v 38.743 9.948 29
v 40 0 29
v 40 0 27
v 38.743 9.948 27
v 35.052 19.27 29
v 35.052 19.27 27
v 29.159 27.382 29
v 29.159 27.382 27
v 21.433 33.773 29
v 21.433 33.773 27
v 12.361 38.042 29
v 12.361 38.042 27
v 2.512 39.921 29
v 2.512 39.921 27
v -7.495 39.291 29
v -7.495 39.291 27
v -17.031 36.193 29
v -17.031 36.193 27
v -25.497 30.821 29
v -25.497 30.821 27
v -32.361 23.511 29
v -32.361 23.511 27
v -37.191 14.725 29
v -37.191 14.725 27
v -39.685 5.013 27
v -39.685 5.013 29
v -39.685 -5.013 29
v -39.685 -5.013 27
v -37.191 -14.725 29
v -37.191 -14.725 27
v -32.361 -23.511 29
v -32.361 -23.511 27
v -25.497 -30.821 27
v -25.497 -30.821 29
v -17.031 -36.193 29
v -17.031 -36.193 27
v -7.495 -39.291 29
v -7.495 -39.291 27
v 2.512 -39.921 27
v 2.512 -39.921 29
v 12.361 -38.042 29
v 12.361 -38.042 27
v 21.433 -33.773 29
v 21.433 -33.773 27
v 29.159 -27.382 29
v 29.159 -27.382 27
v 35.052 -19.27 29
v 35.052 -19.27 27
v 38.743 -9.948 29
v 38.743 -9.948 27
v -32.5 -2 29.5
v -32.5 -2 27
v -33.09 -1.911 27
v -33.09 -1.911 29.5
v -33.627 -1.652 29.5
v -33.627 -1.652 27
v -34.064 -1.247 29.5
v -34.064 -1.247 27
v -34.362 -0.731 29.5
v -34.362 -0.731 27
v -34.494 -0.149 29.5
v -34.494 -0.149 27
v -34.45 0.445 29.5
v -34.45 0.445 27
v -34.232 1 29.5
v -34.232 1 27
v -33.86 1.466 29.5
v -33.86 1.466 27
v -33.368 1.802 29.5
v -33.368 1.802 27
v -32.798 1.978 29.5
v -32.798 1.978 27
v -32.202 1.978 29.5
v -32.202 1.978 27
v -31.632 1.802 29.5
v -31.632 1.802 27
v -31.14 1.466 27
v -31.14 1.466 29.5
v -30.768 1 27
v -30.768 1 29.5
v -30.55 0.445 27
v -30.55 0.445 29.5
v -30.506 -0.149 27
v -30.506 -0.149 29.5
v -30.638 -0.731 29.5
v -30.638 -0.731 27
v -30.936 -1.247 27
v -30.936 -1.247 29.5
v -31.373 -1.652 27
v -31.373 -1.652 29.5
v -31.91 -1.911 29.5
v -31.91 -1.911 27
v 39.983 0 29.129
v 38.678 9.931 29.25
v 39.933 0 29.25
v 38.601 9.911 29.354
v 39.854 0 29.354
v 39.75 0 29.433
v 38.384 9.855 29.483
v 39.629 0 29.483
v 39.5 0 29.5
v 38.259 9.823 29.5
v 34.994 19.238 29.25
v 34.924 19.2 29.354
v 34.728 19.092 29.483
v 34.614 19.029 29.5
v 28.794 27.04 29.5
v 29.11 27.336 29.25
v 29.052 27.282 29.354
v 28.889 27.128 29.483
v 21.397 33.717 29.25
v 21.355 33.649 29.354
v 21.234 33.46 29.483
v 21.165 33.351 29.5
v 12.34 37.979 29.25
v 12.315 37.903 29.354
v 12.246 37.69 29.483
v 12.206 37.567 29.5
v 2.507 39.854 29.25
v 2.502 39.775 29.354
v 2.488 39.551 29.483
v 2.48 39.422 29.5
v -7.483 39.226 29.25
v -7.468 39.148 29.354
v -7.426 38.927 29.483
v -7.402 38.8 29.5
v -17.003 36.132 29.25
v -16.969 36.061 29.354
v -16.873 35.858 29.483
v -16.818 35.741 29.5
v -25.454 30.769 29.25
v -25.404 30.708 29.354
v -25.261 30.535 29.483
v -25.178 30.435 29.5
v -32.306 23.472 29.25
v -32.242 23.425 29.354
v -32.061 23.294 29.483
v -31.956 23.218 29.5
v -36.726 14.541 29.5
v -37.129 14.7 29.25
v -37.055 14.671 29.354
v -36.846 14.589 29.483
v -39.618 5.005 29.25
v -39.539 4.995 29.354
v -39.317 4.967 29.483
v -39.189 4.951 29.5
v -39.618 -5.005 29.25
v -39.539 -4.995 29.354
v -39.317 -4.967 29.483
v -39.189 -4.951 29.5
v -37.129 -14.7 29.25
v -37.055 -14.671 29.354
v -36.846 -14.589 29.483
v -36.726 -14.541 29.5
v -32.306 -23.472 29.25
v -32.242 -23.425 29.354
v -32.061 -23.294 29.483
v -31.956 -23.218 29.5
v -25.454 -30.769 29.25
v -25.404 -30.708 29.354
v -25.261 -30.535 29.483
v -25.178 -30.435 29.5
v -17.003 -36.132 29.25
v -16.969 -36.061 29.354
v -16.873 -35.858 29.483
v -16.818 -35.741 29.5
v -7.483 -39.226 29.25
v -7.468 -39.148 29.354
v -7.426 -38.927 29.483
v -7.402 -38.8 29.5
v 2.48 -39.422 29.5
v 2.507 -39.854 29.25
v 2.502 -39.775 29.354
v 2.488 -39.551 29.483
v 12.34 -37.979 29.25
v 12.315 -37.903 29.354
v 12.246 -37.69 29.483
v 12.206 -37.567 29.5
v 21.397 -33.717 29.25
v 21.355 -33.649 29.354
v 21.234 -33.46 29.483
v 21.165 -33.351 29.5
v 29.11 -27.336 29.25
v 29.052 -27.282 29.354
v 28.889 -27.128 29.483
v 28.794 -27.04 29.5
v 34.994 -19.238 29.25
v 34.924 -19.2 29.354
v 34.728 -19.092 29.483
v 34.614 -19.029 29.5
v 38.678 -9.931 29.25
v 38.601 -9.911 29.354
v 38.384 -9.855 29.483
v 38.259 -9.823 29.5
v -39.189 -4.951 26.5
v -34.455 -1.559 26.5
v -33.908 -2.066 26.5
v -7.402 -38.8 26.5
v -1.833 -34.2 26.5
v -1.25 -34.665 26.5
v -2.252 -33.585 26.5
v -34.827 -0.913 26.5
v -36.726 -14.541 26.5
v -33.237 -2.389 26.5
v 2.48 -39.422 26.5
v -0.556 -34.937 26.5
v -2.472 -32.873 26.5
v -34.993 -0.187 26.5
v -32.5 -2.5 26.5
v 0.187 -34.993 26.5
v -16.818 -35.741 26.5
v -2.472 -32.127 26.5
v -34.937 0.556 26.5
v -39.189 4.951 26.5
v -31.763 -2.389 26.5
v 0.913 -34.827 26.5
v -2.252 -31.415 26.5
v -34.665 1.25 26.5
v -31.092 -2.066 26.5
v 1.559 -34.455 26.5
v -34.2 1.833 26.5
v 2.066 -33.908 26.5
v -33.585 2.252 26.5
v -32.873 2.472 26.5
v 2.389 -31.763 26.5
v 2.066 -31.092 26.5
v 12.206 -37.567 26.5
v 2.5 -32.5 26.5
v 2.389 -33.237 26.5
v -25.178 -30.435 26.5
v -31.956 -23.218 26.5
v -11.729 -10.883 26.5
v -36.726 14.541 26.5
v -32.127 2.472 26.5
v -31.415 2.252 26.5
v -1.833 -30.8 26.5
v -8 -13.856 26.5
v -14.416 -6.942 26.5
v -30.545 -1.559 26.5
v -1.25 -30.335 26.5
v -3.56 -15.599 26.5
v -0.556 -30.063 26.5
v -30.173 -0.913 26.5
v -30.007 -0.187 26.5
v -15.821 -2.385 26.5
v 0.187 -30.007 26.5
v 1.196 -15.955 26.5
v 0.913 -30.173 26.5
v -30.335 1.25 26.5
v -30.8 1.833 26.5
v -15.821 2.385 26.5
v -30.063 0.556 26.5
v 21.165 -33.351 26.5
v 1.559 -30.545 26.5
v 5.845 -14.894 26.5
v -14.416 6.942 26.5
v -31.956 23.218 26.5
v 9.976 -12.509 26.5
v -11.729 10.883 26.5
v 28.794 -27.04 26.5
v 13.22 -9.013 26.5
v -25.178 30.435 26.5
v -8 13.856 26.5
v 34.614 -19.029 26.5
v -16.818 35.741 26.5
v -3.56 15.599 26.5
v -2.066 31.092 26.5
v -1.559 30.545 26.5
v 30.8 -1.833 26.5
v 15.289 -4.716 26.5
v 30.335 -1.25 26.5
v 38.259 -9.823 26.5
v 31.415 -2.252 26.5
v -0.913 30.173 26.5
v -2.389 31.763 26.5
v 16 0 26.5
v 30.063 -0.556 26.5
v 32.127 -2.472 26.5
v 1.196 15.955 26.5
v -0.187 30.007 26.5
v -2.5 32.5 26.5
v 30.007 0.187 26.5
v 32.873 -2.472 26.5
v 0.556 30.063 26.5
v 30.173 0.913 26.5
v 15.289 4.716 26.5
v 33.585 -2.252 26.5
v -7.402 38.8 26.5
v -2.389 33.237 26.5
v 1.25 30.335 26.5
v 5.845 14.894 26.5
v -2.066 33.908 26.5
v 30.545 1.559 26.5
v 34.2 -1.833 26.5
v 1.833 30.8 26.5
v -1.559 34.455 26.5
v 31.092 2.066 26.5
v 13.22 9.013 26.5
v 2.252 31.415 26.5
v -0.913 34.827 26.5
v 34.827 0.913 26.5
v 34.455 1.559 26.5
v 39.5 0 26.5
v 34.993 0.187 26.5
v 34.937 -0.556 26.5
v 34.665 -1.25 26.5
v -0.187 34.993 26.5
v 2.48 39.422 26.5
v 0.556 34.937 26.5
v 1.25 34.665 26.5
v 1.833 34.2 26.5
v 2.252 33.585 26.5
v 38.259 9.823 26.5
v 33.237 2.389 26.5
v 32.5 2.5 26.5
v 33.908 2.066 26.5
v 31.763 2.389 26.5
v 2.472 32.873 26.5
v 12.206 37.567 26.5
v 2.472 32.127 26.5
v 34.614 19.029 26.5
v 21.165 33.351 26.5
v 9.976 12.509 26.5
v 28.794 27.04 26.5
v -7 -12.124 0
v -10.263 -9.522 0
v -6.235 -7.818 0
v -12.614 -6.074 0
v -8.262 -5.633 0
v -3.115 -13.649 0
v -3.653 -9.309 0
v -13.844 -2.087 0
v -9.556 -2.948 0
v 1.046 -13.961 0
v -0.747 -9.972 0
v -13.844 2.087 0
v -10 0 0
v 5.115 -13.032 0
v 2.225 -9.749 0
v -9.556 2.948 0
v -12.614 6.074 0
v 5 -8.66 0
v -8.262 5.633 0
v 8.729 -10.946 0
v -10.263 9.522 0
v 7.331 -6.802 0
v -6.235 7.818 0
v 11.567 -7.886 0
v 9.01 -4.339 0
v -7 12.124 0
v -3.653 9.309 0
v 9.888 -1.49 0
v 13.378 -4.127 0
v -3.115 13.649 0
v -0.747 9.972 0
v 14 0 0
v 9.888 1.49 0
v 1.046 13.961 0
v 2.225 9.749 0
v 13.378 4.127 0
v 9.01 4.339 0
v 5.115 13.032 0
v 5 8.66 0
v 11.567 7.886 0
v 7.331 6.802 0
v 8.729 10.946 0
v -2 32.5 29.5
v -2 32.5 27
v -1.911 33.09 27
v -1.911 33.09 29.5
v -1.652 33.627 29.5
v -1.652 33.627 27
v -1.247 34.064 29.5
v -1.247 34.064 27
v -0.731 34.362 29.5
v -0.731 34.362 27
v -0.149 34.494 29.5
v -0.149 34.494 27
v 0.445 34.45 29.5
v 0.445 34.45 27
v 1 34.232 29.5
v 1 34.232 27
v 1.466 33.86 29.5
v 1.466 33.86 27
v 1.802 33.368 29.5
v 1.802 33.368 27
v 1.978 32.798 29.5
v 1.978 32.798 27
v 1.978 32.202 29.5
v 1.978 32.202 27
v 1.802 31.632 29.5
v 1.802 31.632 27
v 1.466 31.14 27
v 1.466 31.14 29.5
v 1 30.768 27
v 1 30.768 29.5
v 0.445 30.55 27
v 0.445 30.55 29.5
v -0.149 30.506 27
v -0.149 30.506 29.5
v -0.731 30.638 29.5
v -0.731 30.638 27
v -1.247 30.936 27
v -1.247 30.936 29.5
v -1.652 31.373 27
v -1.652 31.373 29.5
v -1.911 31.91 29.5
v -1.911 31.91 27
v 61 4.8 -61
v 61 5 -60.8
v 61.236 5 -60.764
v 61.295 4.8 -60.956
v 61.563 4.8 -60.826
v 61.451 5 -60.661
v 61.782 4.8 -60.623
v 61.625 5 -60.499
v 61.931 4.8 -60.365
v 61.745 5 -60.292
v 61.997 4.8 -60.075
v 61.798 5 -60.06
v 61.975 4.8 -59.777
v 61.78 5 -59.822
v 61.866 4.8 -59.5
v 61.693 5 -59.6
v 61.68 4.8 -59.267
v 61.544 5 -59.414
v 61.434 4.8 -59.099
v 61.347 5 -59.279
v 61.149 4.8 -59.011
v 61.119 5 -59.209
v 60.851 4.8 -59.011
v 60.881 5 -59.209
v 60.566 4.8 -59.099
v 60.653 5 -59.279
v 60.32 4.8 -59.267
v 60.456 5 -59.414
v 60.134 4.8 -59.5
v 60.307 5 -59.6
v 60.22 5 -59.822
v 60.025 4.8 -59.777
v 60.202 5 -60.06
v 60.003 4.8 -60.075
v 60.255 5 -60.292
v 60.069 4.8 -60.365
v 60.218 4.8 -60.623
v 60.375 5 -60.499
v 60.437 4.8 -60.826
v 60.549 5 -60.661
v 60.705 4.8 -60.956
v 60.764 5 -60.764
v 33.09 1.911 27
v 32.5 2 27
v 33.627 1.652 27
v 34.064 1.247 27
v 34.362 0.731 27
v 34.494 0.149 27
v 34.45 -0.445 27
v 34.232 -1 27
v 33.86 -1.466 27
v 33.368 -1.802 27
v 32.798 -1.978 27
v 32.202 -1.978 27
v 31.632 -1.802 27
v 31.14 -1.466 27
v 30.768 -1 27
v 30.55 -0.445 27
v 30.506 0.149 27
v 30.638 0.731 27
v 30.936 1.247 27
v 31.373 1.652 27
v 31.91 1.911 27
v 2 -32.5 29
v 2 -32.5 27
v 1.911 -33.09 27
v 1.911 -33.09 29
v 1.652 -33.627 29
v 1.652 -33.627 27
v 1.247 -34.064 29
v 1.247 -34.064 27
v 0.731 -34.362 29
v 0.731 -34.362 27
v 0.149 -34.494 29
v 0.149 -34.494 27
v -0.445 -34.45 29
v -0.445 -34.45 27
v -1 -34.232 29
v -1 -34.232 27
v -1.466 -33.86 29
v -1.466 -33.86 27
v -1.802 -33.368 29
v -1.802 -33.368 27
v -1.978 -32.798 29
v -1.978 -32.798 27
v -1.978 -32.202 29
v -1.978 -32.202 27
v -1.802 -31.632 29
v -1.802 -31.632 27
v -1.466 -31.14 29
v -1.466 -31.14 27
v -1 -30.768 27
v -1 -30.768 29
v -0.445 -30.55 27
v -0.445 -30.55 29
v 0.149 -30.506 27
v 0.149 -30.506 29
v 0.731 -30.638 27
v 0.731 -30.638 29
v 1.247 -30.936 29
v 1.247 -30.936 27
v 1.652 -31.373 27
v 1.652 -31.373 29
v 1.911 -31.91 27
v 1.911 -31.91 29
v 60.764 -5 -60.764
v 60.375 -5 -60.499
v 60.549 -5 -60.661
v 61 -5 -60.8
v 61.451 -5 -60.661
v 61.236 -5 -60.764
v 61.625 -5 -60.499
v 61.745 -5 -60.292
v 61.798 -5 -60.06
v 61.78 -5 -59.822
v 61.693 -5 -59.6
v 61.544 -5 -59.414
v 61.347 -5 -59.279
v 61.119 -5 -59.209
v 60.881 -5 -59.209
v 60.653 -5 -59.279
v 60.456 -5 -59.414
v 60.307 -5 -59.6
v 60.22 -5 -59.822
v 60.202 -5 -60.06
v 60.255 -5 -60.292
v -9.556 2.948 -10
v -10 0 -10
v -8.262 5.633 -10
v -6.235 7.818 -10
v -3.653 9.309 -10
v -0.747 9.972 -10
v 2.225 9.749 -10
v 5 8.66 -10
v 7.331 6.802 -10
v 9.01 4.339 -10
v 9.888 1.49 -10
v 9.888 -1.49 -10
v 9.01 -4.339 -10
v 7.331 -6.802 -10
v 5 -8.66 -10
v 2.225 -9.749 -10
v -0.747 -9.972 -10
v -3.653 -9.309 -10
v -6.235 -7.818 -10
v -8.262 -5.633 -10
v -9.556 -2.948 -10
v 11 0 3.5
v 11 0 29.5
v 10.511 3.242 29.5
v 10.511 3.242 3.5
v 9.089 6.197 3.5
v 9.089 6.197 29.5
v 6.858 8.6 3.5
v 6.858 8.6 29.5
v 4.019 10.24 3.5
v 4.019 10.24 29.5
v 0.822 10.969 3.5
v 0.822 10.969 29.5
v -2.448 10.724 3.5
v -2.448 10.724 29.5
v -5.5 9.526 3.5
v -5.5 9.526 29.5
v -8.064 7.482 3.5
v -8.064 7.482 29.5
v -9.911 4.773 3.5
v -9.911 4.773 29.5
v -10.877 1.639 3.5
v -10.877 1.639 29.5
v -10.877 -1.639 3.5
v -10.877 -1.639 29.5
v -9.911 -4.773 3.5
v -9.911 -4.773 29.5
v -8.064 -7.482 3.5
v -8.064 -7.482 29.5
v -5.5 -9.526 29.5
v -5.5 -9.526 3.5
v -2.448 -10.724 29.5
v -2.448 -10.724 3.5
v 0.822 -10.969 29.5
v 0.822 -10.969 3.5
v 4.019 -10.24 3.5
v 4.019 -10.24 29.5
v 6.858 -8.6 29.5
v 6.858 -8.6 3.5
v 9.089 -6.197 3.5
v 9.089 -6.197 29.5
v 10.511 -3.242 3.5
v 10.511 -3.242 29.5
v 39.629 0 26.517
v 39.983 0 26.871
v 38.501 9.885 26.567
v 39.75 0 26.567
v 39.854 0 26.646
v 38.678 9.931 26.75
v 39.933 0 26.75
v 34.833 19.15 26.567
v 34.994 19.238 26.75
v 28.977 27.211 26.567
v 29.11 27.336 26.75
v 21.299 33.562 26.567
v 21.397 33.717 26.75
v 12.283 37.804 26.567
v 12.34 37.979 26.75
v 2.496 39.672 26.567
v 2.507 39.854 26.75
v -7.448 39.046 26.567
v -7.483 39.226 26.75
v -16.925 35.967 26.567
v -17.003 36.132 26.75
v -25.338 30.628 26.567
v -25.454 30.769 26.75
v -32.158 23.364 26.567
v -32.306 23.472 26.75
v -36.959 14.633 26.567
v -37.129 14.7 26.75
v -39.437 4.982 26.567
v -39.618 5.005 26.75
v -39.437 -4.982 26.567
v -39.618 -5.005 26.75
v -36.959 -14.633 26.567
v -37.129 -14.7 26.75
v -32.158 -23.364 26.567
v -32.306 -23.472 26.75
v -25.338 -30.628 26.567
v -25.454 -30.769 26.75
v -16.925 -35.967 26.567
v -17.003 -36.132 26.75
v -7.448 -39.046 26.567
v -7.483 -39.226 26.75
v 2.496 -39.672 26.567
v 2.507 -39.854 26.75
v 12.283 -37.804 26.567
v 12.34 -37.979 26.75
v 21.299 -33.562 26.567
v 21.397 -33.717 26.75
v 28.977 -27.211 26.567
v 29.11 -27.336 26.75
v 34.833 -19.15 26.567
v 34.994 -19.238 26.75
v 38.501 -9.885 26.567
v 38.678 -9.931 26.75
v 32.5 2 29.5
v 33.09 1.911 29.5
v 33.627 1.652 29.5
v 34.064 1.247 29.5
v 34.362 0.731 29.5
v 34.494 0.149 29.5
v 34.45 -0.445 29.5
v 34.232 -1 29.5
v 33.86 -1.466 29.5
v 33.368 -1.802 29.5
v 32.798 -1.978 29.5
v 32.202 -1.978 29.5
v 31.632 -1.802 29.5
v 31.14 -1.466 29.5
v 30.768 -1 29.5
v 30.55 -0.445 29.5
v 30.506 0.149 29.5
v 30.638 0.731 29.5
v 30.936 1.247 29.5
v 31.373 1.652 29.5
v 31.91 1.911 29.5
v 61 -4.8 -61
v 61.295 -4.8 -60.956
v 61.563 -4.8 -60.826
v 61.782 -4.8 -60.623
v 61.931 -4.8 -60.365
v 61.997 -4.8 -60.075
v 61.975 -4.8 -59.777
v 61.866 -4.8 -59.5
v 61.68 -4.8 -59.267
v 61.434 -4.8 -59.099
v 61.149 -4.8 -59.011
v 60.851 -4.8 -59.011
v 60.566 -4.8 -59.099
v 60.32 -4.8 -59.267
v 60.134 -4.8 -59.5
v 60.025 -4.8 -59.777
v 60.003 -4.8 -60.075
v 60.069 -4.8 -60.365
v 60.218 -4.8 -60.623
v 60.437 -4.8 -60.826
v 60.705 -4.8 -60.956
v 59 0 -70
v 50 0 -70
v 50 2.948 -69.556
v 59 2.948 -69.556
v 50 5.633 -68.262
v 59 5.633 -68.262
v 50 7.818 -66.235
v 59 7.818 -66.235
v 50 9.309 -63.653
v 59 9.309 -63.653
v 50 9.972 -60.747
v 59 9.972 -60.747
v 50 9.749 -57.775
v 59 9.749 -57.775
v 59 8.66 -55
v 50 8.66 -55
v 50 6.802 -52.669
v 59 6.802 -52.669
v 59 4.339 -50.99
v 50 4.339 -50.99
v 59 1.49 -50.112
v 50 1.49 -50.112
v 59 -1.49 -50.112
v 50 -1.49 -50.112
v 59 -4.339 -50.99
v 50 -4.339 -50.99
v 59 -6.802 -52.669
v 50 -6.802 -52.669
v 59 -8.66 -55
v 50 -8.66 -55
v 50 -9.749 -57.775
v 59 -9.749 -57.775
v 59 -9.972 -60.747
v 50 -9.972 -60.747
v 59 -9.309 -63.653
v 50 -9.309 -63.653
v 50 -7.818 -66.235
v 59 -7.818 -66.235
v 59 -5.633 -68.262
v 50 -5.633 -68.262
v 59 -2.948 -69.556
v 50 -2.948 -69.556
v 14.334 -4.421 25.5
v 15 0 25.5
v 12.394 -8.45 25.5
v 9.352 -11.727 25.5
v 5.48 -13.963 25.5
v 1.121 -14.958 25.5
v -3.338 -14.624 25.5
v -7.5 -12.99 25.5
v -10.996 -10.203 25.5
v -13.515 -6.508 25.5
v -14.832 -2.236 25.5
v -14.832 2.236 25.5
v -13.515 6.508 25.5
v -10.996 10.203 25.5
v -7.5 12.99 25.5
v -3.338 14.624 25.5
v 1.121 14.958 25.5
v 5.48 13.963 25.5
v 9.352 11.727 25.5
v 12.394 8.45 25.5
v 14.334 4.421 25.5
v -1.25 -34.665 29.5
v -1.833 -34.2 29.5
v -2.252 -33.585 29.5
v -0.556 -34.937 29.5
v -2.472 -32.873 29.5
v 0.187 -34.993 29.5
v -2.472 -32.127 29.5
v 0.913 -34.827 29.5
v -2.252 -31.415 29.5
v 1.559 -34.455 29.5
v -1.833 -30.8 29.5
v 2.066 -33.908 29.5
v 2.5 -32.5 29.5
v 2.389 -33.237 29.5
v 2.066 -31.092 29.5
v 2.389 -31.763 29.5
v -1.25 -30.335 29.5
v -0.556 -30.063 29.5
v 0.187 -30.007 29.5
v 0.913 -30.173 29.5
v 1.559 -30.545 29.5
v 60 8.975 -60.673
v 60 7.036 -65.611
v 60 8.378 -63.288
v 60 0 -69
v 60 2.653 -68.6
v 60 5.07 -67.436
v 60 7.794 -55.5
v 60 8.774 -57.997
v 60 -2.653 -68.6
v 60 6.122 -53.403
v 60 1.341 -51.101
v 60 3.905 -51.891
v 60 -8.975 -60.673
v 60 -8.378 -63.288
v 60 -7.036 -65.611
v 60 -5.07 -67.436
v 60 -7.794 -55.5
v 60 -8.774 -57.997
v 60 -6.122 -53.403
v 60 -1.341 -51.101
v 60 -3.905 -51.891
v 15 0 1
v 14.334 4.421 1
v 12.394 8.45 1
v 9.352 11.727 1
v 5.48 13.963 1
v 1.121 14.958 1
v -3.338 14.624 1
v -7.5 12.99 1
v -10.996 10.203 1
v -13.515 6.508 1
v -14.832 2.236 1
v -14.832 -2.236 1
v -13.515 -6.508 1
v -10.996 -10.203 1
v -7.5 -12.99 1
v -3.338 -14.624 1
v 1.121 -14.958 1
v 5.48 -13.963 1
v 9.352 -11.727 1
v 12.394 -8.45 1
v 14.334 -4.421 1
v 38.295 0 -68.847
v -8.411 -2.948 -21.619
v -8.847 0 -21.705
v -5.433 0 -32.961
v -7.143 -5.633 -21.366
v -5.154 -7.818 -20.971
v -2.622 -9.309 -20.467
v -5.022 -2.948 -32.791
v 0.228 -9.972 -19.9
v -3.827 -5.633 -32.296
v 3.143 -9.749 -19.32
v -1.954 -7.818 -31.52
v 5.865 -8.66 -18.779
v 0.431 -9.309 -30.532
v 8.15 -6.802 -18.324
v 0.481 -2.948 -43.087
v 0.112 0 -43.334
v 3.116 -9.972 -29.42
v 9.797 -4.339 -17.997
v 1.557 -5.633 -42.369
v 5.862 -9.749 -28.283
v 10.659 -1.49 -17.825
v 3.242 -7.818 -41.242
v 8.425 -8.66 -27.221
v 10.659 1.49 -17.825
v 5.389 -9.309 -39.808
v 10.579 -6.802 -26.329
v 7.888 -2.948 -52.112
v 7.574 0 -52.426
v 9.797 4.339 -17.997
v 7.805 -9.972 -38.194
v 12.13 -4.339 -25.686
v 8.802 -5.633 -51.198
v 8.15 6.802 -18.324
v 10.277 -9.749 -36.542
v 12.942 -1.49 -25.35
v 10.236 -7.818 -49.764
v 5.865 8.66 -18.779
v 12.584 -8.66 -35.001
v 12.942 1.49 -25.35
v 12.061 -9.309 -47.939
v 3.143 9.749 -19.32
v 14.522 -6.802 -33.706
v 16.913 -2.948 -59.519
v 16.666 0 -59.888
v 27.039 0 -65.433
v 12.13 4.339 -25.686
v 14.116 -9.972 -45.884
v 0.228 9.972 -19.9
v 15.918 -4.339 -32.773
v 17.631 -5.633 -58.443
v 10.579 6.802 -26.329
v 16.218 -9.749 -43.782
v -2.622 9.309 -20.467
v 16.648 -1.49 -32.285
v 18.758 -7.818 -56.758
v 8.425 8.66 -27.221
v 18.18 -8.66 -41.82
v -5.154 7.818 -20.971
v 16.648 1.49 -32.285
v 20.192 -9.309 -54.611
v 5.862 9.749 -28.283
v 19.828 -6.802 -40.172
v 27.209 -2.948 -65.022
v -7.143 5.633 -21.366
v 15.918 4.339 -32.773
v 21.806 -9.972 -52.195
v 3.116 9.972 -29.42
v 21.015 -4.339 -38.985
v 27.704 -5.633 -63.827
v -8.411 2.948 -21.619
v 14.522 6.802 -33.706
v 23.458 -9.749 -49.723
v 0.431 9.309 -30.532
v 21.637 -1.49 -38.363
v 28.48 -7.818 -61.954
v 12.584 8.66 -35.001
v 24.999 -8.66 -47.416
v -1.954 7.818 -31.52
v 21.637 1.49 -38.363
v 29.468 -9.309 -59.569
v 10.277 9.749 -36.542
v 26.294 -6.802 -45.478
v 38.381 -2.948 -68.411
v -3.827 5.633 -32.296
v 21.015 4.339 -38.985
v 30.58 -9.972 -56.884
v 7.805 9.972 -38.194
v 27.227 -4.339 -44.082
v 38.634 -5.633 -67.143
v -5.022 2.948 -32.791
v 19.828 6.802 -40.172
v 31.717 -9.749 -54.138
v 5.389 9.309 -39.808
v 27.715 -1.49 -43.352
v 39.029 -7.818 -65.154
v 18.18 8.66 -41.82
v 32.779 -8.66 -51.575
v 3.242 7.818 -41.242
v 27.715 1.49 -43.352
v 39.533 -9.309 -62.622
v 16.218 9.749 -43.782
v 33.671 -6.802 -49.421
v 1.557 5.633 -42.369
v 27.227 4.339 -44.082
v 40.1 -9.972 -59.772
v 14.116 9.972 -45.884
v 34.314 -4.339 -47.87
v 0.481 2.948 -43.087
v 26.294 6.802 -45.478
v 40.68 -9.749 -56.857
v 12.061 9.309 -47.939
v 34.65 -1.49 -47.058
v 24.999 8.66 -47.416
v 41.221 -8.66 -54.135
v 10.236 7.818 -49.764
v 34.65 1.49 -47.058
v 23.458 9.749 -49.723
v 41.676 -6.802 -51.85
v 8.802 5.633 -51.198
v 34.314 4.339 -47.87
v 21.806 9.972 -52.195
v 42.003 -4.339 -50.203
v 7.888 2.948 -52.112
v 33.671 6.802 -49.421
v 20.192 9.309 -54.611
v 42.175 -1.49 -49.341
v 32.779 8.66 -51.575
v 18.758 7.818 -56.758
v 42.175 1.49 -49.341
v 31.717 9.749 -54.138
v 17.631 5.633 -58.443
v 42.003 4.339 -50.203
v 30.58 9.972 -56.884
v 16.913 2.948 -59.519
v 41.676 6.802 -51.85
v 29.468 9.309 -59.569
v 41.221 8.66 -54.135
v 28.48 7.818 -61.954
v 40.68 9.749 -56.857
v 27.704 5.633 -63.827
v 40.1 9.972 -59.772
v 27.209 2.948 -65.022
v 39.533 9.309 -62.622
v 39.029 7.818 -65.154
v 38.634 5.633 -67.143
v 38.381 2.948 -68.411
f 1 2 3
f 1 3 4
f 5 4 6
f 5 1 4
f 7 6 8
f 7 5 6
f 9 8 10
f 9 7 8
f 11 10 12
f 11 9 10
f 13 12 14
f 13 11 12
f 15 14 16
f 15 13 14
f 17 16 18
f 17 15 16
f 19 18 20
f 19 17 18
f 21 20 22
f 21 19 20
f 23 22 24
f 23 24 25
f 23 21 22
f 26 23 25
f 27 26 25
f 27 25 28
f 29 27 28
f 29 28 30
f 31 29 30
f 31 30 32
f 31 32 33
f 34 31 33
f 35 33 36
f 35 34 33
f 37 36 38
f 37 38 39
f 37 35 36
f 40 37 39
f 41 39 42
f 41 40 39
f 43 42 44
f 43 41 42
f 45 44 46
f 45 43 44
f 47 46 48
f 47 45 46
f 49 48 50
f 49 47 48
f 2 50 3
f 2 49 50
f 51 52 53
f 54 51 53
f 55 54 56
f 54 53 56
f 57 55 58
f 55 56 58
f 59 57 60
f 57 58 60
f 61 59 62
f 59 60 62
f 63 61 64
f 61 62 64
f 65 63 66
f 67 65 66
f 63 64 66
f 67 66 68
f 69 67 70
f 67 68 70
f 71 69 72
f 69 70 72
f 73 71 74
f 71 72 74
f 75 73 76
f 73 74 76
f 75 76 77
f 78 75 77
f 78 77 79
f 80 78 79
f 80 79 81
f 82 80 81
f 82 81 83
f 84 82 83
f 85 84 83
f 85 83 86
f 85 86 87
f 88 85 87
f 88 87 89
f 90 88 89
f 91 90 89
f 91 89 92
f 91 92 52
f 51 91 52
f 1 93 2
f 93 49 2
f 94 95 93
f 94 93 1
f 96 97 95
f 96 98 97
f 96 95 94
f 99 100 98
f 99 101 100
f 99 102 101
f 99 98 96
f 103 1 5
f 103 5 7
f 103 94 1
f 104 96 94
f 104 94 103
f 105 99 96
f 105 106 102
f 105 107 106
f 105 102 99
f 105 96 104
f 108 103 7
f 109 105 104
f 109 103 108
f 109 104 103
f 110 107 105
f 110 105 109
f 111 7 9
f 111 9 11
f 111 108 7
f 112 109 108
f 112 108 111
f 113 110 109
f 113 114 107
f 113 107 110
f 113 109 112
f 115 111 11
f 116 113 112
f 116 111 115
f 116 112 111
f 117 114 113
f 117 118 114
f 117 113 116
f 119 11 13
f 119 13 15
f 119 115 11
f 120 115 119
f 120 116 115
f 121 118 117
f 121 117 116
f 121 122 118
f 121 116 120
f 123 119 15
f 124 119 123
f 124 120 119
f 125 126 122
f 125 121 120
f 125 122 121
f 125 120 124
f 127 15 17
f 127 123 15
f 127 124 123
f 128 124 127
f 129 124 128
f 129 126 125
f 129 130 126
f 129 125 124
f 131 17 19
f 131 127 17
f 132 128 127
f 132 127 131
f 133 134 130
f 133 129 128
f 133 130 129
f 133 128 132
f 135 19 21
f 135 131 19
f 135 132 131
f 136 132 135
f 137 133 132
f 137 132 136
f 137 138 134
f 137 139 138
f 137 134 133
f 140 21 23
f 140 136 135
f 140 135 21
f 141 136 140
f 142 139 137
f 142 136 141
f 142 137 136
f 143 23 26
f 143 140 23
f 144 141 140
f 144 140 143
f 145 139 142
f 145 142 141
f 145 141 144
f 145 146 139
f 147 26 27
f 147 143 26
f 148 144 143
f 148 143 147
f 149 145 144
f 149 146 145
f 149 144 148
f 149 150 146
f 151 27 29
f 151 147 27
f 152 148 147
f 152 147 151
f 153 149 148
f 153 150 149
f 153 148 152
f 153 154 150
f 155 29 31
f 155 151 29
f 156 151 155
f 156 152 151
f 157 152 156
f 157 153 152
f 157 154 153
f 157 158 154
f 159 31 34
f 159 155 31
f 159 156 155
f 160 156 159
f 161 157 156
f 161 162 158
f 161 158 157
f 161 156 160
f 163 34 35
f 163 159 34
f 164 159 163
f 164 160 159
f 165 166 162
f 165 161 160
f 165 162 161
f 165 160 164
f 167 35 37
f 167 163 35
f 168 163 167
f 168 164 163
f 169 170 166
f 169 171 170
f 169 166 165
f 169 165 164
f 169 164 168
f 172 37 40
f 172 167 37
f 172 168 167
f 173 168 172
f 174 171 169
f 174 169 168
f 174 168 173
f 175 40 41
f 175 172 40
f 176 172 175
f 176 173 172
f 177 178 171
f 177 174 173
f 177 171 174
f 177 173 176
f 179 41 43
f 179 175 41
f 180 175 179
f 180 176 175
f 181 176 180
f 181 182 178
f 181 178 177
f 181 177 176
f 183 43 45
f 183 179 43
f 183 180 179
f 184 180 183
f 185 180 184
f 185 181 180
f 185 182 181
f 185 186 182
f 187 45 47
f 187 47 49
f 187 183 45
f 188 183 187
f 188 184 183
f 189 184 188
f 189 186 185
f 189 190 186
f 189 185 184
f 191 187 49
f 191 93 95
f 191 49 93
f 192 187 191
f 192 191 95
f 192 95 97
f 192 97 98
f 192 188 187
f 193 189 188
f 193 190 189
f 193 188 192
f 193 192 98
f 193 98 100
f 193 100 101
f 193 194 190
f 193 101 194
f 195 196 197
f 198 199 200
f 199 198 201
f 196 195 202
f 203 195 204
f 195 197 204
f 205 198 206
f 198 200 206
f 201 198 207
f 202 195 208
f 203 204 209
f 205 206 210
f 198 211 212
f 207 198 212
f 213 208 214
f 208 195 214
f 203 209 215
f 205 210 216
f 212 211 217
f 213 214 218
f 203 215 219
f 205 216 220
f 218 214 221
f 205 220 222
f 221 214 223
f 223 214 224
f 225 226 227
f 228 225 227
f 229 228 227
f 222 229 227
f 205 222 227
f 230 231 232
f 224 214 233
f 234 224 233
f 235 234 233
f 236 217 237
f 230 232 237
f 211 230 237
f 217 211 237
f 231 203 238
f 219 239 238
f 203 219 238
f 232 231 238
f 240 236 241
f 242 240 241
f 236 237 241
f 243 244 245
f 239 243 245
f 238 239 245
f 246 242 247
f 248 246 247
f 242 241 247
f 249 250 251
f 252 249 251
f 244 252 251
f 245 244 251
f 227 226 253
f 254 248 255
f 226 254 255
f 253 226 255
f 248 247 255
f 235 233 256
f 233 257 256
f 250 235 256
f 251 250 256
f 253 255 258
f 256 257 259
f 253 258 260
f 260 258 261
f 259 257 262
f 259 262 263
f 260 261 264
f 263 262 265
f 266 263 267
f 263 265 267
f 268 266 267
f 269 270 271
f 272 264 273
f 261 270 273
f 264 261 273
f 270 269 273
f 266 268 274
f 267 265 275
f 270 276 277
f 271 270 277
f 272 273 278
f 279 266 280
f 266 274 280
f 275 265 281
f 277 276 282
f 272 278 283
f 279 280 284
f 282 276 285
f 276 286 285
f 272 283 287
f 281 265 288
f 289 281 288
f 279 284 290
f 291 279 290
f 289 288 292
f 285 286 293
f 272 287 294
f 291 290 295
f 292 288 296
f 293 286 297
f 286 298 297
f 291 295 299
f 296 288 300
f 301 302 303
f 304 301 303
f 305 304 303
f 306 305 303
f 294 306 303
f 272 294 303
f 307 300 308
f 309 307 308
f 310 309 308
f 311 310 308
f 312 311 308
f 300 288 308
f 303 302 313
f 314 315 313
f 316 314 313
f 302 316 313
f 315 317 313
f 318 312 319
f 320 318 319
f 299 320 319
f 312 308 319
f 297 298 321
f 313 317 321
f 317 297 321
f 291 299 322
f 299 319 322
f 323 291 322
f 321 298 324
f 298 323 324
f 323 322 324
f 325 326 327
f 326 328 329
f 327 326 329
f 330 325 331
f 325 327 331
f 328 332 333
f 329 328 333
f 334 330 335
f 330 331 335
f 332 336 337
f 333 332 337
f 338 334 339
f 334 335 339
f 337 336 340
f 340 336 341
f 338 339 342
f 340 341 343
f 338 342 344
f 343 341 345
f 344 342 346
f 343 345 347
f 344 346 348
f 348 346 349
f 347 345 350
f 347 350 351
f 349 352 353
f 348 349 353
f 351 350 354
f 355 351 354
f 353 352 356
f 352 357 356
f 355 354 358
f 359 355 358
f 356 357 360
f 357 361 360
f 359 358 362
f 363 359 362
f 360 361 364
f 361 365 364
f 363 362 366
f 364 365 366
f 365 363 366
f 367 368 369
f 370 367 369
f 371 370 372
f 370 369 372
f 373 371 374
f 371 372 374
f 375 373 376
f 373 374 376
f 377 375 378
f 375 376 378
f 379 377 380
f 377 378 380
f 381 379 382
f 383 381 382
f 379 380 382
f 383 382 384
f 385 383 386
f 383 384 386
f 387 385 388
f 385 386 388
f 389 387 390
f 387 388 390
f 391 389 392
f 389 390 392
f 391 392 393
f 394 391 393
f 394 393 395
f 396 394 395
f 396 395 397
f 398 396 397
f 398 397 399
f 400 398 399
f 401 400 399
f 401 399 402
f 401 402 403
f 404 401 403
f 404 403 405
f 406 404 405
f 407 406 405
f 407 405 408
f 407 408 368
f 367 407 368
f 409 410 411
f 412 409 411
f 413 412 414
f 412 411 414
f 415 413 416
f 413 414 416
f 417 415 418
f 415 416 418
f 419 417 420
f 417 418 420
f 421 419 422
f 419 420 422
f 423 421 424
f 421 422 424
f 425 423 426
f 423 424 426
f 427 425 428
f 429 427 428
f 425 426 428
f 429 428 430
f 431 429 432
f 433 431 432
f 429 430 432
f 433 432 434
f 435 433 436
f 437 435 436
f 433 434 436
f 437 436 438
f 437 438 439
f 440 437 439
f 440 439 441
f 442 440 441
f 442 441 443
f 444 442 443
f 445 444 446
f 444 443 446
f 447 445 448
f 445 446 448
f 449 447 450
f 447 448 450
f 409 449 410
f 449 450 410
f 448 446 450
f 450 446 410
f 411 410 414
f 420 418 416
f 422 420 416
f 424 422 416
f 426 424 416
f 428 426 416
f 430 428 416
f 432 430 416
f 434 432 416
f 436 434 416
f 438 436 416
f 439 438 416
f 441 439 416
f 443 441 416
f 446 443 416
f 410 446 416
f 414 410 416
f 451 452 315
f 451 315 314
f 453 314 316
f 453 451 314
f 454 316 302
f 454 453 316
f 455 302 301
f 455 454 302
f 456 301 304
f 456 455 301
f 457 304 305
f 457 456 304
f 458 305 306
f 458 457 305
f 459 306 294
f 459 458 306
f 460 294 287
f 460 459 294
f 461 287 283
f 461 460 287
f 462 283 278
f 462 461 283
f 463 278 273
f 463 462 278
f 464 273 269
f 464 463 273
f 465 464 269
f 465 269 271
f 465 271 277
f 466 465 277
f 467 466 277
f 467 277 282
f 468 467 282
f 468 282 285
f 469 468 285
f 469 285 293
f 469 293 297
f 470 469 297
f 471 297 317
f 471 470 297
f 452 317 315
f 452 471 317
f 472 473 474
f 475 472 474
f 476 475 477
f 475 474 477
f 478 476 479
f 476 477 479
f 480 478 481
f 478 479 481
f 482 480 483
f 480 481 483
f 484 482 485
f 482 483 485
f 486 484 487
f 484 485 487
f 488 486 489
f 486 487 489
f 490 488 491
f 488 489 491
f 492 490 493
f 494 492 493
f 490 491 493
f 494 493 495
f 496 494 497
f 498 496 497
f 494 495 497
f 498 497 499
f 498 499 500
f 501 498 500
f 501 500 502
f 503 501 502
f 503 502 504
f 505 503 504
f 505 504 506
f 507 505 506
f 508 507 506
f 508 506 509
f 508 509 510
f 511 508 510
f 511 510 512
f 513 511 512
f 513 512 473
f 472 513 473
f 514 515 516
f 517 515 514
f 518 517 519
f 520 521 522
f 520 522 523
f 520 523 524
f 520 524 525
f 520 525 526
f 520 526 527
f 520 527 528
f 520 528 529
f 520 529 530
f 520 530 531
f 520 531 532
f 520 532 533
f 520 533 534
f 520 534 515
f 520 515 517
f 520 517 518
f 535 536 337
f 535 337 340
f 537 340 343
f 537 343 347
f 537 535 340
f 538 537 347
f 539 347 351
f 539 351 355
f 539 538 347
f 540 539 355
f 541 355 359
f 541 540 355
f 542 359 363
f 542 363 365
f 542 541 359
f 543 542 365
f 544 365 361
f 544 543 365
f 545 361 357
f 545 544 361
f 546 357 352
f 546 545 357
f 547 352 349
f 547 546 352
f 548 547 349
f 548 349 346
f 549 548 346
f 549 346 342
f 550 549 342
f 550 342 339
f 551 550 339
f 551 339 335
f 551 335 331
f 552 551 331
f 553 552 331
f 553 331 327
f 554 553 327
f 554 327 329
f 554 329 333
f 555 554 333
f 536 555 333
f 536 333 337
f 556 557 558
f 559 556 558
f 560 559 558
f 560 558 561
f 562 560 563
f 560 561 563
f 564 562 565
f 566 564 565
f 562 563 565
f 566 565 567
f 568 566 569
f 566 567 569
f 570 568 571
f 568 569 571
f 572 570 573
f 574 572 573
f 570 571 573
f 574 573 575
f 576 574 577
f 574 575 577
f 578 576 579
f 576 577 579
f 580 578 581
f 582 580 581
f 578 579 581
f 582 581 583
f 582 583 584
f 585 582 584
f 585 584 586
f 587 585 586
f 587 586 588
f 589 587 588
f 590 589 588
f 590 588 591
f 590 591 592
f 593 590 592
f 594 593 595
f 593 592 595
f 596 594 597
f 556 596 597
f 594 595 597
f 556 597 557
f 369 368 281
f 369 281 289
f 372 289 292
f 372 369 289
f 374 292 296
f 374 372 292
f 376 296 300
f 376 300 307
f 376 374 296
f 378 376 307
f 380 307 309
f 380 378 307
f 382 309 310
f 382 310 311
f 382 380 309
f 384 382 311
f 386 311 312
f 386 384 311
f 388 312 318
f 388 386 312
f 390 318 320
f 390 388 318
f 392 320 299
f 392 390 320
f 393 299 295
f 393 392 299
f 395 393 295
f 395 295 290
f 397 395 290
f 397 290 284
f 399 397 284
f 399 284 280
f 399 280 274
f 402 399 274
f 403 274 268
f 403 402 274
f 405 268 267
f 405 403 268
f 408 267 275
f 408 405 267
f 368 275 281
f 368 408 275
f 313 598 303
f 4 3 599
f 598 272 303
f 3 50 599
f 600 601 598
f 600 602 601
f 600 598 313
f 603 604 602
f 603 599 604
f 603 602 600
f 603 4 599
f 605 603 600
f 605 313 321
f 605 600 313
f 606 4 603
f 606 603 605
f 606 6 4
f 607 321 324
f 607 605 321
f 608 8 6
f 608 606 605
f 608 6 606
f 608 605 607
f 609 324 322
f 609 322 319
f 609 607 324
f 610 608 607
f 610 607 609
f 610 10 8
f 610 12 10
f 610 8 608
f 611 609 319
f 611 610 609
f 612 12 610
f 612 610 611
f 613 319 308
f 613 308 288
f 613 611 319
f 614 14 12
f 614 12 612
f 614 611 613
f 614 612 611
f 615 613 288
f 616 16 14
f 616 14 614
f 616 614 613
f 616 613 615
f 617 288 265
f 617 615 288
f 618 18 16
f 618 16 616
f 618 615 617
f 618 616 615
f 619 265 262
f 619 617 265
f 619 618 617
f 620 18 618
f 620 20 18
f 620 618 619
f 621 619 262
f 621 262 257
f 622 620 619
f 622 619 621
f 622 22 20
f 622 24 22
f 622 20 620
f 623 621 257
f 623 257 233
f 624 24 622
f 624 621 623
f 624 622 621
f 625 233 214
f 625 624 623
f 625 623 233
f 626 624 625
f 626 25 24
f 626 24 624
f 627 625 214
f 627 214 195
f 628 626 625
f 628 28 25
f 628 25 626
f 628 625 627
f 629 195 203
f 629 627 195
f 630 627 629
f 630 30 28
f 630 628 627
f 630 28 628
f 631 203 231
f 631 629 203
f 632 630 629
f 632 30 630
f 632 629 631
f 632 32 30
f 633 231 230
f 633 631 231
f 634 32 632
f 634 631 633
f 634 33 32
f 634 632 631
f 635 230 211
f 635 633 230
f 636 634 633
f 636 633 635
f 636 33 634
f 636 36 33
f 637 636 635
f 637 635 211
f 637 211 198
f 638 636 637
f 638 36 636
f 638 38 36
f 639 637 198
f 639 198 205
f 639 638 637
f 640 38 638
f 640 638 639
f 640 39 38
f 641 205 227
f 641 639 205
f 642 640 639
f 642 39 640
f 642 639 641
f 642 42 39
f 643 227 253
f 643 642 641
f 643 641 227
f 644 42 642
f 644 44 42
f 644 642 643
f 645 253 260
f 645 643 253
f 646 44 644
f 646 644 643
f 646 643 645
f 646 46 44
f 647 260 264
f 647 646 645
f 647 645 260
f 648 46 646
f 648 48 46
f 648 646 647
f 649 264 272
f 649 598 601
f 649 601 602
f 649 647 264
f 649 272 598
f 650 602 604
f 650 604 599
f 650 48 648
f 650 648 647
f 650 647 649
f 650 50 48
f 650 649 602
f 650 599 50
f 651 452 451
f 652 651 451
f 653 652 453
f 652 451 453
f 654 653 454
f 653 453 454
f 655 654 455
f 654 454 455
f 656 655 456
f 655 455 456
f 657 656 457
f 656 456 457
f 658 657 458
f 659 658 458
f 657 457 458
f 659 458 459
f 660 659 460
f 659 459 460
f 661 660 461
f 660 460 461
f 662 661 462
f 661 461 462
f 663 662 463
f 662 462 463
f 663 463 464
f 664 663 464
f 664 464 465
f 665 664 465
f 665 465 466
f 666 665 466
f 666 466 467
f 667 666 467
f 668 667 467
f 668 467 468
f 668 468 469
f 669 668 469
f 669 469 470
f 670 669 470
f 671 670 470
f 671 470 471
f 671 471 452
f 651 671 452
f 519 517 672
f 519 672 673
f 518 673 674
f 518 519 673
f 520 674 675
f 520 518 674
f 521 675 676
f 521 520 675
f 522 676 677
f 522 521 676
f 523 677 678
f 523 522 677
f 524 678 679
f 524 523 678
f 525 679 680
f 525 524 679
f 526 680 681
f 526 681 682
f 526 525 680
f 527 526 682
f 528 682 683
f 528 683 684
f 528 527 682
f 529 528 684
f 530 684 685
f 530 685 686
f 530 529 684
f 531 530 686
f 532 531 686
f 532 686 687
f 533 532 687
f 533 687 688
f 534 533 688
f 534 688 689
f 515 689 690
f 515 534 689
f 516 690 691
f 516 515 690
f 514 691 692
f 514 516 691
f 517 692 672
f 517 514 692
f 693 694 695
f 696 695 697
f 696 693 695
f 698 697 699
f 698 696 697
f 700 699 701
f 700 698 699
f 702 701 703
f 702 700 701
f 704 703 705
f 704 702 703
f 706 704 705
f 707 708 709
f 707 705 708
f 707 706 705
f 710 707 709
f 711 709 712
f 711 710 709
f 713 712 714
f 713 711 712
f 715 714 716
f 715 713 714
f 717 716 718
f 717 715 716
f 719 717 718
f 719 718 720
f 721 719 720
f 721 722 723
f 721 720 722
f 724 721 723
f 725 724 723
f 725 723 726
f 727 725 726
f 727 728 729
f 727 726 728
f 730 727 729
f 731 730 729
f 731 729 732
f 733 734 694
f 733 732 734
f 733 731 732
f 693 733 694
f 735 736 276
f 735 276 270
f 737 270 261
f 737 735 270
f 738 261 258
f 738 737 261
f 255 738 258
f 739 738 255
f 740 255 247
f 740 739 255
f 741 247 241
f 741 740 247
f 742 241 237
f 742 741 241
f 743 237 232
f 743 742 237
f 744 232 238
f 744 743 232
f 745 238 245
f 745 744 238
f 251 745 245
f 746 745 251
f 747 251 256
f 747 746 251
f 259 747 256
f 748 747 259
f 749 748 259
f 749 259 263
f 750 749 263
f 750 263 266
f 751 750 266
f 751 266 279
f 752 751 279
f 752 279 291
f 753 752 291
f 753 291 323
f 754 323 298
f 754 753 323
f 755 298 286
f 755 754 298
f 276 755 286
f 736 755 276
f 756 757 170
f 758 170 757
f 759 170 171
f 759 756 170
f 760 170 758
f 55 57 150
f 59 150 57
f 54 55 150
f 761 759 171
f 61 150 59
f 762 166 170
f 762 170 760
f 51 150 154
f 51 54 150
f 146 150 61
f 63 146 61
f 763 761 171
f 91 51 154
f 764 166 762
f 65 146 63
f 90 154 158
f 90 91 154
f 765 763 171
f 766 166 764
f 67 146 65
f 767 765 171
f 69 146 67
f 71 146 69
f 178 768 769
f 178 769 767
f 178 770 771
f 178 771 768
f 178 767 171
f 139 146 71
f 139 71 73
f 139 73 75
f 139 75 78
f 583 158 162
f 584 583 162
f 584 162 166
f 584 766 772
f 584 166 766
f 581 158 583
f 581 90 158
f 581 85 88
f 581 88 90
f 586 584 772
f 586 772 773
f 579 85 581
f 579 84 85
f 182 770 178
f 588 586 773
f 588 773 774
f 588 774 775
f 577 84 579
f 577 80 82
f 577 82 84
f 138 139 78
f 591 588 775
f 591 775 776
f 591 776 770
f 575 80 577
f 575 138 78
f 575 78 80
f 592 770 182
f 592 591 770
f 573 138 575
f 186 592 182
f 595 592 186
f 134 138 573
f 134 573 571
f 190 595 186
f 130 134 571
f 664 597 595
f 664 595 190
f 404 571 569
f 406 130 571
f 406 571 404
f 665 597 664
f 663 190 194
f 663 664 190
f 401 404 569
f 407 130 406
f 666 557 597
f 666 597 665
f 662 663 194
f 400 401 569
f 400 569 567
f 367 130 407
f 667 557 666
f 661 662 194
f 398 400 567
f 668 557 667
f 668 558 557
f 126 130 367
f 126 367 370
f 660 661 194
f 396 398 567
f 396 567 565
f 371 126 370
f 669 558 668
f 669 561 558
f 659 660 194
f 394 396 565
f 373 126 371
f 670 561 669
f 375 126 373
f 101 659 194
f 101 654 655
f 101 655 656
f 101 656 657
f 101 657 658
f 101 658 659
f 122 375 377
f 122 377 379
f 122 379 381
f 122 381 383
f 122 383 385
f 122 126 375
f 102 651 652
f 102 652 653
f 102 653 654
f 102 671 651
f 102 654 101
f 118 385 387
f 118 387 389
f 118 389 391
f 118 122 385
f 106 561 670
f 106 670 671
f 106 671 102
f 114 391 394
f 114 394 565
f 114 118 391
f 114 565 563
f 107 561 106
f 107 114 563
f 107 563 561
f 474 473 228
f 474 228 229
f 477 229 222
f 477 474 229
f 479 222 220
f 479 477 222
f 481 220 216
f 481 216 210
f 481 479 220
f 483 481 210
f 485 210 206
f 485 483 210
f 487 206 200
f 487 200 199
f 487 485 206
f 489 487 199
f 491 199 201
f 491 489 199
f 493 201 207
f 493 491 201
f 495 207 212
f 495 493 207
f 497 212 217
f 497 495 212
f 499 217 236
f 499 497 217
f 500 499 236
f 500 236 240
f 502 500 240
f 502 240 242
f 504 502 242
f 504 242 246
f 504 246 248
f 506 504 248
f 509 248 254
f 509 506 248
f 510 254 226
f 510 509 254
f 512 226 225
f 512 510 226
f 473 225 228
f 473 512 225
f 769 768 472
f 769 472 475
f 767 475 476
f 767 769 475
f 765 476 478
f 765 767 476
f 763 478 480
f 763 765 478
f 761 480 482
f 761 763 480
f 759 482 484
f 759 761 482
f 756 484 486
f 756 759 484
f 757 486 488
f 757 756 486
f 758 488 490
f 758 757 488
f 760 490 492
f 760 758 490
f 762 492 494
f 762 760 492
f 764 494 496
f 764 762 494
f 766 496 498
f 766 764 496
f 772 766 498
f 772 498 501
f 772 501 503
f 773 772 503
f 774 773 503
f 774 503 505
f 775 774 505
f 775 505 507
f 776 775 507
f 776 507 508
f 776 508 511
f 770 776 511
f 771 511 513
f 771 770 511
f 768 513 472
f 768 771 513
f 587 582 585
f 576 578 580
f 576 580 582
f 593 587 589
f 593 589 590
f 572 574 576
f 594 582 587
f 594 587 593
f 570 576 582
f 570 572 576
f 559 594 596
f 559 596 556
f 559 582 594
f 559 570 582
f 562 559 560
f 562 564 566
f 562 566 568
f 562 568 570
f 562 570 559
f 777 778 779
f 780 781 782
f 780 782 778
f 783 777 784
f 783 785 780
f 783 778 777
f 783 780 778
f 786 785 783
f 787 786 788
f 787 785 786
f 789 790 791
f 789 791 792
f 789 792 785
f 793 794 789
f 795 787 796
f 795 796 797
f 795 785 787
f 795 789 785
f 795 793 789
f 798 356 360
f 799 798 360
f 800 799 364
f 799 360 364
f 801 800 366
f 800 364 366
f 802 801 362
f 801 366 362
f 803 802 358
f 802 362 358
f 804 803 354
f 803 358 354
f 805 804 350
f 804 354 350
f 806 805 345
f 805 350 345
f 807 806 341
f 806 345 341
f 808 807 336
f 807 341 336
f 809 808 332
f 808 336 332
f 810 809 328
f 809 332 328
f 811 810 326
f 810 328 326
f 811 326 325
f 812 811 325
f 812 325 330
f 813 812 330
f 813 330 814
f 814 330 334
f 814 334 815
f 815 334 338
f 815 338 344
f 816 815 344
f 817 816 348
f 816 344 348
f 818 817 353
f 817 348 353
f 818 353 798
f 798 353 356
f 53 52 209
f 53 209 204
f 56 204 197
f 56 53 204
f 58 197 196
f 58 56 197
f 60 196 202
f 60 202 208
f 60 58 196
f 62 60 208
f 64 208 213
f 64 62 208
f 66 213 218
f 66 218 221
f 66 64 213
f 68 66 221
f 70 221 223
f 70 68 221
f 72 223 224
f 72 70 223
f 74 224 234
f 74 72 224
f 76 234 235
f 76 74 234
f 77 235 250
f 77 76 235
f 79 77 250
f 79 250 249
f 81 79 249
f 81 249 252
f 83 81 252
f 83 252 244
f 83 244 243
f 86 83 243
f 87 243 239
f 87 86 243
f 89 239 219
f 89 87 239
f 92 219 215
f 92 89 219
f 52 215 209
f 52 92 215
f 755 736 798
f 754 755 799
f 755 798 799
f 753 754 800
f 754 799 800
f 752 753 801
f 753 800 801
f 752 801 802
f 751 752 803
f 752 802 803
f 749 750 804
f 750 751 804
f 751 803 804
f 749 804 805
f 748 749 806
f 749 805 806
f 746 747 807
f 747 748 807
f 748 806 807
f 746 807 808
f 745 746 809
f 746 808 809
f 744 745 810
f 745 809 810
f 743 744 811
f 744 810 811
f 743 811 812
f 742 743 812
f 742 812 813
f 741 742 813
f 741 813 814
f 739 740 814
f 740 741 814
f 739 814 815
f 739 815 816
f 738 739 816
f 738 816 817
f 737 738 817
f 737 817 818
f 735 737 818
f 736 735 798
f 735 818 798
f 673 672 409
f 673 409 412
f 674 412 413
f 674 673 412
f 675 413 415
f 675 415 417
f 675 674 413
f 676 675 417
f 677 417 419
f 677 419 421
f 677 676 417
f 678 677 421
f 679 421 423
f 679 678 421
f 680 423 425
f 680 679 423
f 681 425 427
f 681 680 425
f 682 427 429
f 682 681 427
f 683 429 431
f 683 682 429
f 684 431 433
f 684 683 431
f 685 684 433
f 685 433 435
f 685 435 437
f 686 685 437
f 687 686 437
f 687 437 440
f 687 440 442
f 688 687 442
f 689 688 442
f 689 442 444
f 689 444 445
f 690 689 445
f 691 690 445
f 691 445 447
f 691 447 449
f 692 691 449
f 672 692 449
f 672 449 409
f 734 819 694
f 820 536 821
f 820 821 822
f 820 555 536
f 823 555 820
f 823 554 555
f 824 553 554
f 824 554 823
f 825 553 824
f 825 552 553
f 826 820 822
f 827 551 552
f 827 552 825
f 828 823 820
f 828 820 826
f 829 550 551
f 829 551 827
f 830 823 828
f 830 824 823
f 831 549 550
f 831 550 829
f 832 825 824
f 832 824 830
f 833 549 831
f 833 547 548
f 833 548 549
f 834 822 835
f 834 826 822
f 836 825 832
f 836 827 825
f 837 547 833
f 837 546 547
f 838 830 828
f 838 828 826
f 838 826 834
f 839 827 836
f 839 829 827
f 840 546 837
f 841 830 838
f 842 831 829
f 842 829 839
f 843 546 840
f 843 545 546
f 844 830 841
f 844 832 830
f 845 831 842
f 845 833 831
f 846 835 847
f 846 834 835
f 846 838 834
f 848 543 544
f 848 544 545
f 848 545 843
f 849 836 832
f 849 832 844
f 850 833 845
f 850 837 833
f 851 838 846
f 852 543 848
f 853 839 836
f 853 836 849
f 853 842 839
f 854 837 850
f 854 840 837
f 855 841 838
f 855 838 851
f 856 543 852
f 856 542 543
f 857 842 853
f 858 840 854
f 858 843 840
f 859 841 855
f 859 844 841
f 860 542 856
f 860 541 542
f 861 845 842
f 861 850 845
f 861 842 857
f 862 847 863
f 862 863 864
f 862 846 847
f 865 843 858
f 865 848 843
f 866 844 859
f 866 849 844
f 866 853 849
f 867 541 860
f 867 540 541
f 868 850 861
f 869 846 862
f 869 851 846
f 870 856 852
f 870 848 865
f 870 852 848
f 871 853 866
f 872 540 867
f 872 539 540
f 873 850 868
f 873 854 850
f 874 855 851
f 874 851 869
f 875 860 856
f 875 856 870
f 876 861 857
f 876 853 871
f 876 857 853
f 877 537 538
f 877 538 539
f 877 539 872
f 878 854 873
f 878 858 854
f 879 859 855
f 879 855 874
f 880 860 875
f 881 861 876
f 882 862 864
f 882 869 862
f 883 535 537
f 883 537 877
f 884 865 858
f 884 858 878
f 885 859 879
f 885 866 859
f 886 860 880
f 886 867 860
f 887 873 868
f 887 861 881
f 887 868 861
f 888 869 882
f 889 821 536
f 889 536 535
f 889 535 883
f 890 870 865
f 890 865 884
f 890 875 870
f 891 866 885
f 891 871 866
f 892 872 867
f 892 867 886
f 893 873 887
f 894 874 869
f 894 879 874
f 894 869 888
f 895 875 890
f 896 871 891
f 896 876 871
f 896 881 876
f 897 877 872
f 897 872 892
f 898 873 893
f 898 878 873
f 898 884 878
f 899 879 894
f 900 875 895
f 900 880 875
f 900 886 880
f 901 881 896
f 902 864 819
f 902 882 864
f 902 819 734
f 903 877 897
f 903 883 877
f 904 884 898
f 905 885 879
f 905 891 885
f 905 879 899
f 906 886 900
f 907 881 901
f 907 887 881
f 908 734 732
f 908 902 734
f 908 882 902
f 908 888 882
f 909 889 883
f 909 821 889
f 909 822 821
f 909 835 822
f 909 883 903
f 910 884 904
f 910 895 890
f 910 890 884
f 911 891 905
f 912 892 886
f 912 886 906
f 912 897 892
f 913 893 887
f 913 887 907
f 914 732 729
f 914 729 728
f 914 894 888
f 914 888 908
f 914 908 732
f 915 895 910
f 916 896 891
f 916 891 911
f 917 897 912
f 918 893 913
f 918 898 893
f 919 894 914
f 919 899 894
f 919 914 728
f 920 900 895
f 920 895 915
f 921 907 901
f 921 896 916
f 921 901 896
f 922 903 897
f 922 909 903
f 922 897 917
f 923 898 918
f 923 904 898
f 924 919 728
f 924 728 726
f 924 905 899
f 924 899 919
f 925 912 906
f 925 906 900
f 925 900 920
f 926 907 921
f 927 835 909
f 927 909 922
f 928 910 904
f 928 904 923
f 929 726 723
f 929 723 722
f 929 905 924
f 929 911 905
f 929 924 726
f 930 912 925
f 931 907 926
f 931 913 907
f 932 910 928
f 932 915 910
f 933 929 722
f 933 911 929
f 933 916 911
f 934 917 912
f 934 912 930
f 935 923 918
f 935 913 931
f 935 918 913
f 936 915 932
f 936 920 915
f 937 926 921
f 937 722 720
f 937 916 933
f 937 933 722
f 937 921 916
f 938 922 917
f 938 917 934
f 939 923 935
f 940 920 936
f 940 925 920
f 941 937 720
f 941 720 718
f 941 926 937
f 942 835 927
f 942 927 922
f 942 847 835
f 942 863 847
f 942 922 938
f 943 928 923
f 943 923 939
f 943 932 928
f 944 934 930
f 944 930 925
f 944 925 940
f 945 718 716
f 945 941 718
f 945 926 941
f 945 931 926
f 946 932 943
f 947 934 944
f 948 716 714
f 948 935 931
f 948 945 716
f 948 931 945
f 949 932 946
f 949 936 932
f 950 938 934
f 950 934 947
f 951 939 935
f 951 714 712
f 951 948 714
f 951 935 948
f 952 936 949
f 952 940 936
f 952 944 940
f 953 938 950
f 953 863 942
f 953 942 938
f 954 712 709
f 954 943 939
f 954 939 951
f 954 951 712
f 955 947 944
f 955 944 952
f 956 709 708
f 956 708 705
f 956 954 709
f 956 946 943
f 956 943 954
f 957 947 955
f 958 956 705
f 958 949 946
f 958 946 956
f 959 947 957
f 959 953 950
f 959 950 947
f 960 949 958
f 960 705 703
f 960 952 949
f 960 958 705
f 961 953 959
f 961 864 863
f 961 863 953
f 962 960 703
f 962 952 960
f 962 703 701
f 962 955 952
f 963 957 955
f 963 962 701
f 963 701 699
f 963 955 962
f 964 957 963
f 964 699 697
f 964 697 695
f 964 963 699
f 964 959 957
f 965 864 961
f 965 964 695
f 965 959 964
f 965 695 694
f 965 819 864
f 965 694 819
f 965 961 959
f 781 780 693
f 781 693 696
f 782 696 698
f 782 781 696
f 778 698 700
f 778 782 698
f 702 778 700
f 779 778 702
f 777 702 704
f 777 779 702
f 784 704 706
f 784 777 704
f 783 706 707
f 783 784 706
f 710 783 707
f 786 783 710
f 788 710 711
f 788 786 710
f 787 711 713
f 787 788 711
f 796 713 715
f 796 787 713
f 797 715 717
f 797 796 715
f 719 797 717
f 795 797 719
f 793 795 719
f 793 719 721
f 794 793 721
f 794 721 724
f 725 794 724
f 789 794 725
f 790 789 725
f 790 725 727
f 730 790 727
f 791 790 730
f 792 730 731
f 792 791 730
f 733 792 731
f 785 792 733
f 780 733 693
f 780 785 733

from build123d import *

# Parameters (mm, degrees)
SKETCH1_R           = 15
BOSS_EXTRUDE1_DEPTH = 29.5
SKETCH2_R           = 40
BOSS_EXTRUDE2_DEPTH = 3
CHAMFER1_SIZE       = 1
SKETCH3_R           = 11
CUT_EXTRUDE1_DEPTH  = 26
FILLET1_R           = 0.5
SKETCH4_R           = 2
CUT_EXTRUDE2_DEPTH  = 26
CIRPATTERN1_COUNT   = 4
CHAMFER2_SIZE       = 0.5
SKETCH6_R           = 10
CHAMFER3_SIZE       = 1
SKETCH7_R           = 1
BOSS_EXTRUDE3_DEPTH = 5
CHAMFER4_SIZE       = 0.2


with BuildPart() as part:
    # Sketch1 → Boss-Extrude1 (new body)
    with BuildSketch(Plane.XY):
        Circle(SKETCH1_R)
    extrude(amount=BOSS_EXTRUDE1_DEPTH)

    # Sketch2 → Boss-Extrude2 (add)
    with BuildSketch(Plane.XY.offset(29.5)):
        Circle(SKETCH2_R)
    extrude(amount=-BOSS_EXTRUDE2_DEPTH)

    # Chamfer1
    chamfer1_edges = [part.edges().sort_by_distance(p)[0] for p in [
        (-15, 0, 0),
        (-15, 0, 26.5),
    ]]
    chamfer(chamfer1_edges, length=CHAMFER1_SIZE)

    # Sketch3 → Cut-Extrude1 (cut)
    with BuildSketch(Plane.XY.offset(29.5)):
        Circle(SKETCH3_R)
    extrude(amount=-CUT_EXTRUDE1_DEPTH, mode=Mode.SUBTRACT)

    # Fillet1
    fillet1_edges = [part.edges().sort_by_distance(p)[0] for p in [
        (-40, 0, 26.5),
        (-40, 0, 29.5),
    ]]
    fillet(fillet1_edges, radius=FILLET1_R)

    # Sketch4 → Cut-Extrude2 (cut)
    with BuildSketch(Plane(origin=(0, 0, 26.5), x_dir=(-1, 0, 0), z_dir=(0, 0, -1))):
        with Locations((0, 32.5)):
            Circle(SKETCH4_R)
    cut_extrude2 = extrude(amount=-CUT_EXTRUDE2_DEPTH, mode=Mode.SUBTRACT)

    # CirPattern1: Cut-Extrude2 ×4 about axis
    cirpattern1_axis = Axis((0, 0, 0), (0, 0, 1))
    for i in range(1, CIRPATTERN1_COUNT):
        add(cut_extrude2.rotate(cirpattern1_axis, i * 360 / CIRPATTERN1_COUNT), mode=Mode.SUBTRACT)

    # Chamfer2
    chamfer2_edges = [part.edges().sort_by_distance(p)[0] for p in [
        (2, 32.5, 26.5),
        (32.5, -2, 26.5),
        (-2, -32.5, 29.5),
        (-2, -32.5, 26.5),
        (-32.5, 2, 26.5),
    ]]
    chamfer(chamfer2_edges, length=CHAMFER2_SIZE)

    # Sweep1: sweep along a path in Sketch5
    with BuildLine(Plane(origin=(0, 0, 0), x_dir=(1, 0, 0), z_dir=(0, 1, 0))) as sweep1_path:
        Line((0, 0), (0, 10))
        ThreePointArc((0, 10), (14.644660941, 45.355339059), (50, 60))
        Line((50, 60), (60, 60))
    # Sketch6 → Sweep1 (sweep)
    with BuildSketch(Plane(origin=(0, 0, 0), x_dir=(-1, 0, 0), z_dir=(0, 0, -1))):
        Circle(SKETCH6_R)
    sweep(path=sweep1_path.line)

    # Chamfer3
    chamfer3_edges = [part.edges().sort_by_distance(p)[0] for p in [
        (60, 0, -50),
    ]]
    chamfer(chamfer3_edges, length=CHAMFER3_SIZE)


with BuildPart() as body_2:
    # Sketch7 → Boss-Extrude3 (new, symmetric)
    with BuildSketch(Plane.XZ):
        with Locations(Location((61, -60, 0), (0, 0, 270))):
            Circle(SKETCH7_R)
    extrude(amount=BOSS_EXTRUDE3_DEPTH, both=True)

    # Chamfer4
    chamfer4_edges = [body_2.edges().sort_by_distance(p)[0] for p in [
        (61, 5, -59),
        (61, -5, -59),
    ]]
    chamfer(chamfer4_edges, length=CHAMFER4_SIZE)


solid = Compound([part.part, body_2.part])
